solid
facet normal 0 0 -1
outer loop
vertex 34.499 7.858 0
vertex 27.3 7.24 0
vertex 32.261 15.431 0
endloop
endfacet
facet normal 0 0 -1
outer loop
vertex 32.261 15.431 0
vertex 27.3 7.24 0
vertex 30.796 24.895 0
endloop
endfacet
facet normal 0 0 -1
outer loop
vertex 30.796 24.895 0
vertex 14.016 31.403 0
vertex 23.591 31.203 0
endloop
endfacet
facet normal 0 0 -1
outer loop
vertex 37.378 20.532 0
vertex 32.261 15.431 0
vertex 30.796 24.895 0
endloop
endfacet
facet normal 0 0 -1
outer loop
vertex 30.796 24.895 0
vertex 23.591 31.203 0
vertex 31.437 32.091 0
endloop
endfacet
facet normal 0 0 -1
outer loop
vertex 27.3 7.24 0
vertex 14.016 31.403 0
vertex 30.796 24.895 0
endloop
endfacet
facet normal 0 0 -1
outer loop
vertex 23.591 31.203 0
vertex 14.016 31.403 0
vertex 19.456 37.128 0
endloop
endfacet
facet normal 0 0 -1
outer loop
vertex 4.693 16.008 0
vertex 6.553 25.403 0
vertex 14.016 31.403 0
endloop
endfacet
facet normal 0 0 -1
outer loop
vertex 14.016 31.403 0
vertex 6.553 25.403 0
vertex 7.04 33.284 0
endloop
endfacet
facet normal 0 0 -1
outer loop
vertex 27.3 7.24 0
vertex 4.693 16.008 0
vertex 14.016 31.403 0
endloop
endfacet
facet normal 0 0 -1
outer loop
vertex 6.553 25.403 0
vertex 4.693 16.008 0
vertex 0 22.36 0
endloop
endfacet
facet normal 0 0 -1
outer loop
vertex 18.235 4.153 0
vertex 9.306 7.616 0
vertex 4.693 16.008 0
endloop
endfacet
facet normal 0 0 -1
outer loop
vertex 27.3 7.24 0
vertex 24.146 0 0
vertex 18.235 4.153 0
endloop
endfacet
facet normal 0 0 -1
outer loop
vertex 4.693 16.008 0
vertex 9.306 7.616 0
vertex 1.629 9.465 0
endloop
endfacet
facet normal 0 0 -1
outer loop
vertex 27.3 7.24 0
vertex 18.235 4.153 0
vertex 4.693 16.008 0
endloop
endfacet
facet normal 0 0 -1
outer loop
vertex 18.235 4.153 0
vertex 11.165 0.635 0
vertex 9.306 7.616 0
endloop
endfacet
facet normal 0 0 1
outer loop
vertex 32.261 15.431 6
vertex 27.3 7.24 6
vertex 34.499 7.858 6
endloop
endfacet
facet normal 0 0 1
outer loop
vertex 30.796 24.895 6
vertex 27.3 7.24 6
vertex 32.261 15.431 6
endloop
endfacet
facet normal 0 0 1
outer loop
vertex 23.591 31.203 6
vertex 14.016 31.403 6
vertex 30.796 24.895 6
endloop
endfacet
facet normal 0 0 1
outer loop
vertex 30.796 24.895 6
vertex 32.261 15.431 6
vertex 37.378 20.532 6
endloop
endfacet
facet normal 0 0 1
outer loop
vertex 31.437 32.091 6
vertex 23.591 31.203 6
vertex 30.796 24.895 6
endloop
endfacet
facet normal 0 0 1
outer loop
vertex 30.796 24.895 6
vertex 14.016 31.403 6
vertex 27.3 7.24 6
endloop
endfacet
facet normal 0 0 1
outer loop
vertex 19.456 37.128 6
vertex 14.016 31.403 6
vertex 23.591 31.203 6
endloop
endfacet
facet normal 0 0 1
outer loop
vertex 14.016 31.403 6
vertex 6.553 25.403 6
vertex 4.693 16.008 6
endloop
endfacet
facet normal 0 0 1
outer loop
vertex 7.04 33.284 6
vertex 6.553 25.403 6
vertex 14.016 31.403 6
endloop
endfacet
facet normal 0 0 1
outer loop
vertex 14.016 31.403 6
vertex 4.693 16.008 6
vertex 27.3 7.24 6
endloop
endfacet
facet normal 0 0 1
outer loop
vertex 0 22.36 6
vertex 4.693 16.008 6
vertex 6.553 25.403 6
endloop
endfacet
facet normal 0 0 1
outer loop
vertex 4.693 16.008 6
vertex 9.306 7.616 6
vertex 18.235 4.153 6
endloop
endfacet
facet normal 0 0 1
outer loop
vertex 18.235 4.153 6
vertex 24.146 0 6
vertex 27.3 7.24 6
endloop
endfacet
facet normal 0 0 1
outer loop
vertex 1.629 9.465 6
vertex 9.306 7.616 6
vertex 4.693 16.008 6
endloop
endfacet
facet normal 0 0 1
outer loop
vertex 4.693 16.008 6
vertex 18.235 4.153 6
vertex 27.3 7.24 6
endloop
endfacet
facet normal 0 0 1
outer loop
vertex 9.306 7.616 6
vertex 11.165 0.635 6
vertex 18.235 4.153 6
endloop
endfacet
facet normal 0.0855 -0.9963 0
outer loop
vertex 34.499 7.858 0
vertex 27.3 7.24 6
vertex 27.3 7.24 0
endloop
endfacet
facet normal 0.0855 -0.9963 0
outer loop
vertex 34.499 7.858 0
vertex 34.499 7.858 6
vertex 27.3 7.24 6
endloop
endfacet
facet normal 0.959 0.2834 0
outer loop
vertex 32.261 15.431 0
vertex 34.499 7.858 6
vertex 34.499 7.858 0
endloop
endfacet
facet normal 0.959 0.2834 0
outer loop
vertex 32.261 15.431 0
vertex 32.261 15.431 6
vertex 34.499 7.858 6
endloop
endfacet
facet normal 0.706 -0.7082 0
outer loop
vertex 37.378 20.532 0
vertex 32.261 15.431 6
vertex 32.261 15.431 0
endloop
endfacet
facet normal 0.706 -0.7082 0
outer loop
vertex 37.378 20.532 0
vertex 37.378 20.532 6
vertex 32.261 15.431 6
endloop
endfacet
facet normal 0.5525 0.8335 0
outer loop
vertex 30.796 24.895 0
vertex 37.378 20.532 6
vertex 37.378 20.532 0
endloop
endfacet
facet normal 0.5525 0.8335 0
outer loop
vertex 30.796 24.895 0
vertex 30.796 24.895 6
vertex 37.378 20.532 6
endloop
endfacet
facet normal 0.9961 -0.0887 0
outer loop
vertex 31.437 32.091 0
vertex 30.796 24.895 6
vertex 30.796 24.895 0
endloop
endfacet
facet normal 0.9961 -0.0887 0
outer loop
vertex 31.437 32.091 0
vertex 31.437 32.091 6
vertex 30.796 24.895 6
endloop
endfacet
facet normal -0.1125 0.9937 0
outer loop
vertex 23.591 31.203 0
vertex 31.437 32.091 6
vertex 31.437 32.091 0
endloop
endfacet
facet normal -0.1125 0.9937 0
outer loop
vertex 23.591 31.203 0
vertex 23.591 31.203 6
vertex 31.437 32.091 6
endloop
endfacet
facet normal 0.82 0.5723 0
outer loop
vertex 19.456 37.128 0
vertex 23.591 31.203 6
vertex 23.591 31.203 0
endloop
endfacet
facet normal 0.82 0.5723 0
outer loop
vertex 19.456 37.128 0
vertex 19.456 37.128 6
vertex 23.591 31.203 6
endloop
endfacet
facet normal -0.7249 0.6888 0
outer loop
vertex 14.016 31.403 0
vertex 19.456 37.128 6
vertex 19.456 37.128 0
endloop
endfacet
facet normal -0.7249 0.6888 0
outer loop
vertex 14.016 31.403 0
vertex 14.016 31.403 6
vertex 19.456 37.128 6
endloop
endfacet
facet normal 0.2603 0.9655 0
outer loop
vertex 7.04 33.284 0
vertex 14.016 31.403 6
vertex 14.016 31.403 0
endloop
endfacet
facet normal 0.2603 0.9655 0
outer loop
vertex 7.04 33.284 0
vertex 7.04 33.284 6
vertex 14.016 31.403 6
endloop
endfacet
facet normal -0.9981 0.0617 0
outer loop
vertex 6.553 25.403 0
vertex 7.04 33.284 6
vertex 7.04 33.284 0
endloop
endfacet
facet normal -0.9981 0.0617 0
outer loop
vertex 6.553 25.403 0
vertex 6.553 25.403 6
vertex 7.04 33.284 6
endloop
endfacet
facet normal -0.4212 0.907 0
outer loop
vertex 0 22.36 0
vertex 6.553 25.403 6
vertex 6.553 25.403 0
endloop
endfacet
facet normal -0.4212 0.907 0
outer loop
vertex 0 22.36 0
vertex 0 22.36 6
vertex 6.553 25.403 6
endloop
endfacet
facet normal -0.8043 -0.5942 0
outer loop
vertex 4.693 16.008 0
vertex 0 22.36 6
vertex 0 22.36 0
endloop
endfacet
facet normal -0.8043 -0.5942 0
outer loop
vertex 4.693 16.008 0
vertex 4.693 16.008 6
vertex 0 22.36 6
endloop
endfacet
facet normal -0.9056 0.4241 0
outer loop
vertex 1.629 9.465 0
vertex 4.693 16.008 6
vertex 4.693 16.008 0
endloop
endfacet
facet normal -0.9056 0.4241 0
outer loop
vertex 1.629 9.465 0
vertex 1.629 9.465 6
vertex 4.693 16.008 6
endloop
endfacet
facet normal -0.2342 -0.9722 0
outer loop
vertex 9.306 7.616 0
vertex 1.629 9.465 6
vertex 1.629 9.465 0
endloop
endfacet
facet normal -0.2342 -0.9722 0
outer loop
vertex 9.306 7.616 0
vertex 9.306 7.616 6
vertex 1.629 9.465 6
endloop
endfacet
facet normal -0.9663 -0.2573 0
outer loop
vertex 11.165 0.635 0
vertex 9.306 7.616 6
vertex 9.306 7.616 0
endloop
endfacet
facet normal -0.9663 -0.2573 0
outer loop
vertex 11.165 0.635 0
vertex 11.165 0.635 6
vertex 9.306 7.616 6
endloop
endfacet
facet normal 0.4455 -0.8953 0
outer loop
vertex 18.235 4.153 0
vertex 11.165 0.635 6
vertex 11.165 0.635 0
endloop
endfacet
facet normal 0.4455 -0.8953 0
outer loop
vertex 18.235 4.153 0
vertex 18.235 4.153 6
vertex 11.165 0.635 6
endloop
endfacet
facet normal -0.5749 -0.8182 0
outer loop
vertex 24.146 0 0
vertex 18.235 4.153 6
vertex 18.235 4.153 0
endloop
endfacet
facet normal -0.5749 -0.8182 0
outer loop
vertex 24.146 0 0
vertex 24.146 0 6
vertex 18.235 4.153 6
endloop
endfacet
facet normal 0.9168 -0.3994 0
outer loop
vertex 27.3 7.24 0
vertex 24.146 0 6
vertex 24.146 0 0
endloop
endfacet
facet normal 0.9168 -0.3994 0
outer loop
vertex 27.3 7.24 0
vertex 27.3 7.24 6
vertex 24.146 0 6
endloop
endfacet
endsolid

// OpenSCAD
$fn = 32;
// ----------------------------------------------------------------------
// Chain sprocket: 9 teeth, 14 mm root radius
// ----------------------------------------------------------------------

// --- parameters (mm) ---
profile_height = 6;       // extrusion height
profile_points = 18;      // points of the closed outline

profile = [[32.261, 15.431], [37.378, 20.532], [30.796, 24.895], [31.437, 32.091], [23.591, 31.203], [19.456, 37.128], [14.016, 31.403], [7.04, 33.284], [6.553, 25.403], [0, 22.36], [4.693, 16.008], [1.629, 9.465], [9.306, 7.616], [11.165, 0.635], [18.235, 4.153], [24.146, 0], [27.3, 7.24], [34.499, 7.858]];  // single closed polygon, 18 points, counter clockwise

// --- the one profile operation ---
linear_extrude(height = profile_height) polygon(points = profile);
